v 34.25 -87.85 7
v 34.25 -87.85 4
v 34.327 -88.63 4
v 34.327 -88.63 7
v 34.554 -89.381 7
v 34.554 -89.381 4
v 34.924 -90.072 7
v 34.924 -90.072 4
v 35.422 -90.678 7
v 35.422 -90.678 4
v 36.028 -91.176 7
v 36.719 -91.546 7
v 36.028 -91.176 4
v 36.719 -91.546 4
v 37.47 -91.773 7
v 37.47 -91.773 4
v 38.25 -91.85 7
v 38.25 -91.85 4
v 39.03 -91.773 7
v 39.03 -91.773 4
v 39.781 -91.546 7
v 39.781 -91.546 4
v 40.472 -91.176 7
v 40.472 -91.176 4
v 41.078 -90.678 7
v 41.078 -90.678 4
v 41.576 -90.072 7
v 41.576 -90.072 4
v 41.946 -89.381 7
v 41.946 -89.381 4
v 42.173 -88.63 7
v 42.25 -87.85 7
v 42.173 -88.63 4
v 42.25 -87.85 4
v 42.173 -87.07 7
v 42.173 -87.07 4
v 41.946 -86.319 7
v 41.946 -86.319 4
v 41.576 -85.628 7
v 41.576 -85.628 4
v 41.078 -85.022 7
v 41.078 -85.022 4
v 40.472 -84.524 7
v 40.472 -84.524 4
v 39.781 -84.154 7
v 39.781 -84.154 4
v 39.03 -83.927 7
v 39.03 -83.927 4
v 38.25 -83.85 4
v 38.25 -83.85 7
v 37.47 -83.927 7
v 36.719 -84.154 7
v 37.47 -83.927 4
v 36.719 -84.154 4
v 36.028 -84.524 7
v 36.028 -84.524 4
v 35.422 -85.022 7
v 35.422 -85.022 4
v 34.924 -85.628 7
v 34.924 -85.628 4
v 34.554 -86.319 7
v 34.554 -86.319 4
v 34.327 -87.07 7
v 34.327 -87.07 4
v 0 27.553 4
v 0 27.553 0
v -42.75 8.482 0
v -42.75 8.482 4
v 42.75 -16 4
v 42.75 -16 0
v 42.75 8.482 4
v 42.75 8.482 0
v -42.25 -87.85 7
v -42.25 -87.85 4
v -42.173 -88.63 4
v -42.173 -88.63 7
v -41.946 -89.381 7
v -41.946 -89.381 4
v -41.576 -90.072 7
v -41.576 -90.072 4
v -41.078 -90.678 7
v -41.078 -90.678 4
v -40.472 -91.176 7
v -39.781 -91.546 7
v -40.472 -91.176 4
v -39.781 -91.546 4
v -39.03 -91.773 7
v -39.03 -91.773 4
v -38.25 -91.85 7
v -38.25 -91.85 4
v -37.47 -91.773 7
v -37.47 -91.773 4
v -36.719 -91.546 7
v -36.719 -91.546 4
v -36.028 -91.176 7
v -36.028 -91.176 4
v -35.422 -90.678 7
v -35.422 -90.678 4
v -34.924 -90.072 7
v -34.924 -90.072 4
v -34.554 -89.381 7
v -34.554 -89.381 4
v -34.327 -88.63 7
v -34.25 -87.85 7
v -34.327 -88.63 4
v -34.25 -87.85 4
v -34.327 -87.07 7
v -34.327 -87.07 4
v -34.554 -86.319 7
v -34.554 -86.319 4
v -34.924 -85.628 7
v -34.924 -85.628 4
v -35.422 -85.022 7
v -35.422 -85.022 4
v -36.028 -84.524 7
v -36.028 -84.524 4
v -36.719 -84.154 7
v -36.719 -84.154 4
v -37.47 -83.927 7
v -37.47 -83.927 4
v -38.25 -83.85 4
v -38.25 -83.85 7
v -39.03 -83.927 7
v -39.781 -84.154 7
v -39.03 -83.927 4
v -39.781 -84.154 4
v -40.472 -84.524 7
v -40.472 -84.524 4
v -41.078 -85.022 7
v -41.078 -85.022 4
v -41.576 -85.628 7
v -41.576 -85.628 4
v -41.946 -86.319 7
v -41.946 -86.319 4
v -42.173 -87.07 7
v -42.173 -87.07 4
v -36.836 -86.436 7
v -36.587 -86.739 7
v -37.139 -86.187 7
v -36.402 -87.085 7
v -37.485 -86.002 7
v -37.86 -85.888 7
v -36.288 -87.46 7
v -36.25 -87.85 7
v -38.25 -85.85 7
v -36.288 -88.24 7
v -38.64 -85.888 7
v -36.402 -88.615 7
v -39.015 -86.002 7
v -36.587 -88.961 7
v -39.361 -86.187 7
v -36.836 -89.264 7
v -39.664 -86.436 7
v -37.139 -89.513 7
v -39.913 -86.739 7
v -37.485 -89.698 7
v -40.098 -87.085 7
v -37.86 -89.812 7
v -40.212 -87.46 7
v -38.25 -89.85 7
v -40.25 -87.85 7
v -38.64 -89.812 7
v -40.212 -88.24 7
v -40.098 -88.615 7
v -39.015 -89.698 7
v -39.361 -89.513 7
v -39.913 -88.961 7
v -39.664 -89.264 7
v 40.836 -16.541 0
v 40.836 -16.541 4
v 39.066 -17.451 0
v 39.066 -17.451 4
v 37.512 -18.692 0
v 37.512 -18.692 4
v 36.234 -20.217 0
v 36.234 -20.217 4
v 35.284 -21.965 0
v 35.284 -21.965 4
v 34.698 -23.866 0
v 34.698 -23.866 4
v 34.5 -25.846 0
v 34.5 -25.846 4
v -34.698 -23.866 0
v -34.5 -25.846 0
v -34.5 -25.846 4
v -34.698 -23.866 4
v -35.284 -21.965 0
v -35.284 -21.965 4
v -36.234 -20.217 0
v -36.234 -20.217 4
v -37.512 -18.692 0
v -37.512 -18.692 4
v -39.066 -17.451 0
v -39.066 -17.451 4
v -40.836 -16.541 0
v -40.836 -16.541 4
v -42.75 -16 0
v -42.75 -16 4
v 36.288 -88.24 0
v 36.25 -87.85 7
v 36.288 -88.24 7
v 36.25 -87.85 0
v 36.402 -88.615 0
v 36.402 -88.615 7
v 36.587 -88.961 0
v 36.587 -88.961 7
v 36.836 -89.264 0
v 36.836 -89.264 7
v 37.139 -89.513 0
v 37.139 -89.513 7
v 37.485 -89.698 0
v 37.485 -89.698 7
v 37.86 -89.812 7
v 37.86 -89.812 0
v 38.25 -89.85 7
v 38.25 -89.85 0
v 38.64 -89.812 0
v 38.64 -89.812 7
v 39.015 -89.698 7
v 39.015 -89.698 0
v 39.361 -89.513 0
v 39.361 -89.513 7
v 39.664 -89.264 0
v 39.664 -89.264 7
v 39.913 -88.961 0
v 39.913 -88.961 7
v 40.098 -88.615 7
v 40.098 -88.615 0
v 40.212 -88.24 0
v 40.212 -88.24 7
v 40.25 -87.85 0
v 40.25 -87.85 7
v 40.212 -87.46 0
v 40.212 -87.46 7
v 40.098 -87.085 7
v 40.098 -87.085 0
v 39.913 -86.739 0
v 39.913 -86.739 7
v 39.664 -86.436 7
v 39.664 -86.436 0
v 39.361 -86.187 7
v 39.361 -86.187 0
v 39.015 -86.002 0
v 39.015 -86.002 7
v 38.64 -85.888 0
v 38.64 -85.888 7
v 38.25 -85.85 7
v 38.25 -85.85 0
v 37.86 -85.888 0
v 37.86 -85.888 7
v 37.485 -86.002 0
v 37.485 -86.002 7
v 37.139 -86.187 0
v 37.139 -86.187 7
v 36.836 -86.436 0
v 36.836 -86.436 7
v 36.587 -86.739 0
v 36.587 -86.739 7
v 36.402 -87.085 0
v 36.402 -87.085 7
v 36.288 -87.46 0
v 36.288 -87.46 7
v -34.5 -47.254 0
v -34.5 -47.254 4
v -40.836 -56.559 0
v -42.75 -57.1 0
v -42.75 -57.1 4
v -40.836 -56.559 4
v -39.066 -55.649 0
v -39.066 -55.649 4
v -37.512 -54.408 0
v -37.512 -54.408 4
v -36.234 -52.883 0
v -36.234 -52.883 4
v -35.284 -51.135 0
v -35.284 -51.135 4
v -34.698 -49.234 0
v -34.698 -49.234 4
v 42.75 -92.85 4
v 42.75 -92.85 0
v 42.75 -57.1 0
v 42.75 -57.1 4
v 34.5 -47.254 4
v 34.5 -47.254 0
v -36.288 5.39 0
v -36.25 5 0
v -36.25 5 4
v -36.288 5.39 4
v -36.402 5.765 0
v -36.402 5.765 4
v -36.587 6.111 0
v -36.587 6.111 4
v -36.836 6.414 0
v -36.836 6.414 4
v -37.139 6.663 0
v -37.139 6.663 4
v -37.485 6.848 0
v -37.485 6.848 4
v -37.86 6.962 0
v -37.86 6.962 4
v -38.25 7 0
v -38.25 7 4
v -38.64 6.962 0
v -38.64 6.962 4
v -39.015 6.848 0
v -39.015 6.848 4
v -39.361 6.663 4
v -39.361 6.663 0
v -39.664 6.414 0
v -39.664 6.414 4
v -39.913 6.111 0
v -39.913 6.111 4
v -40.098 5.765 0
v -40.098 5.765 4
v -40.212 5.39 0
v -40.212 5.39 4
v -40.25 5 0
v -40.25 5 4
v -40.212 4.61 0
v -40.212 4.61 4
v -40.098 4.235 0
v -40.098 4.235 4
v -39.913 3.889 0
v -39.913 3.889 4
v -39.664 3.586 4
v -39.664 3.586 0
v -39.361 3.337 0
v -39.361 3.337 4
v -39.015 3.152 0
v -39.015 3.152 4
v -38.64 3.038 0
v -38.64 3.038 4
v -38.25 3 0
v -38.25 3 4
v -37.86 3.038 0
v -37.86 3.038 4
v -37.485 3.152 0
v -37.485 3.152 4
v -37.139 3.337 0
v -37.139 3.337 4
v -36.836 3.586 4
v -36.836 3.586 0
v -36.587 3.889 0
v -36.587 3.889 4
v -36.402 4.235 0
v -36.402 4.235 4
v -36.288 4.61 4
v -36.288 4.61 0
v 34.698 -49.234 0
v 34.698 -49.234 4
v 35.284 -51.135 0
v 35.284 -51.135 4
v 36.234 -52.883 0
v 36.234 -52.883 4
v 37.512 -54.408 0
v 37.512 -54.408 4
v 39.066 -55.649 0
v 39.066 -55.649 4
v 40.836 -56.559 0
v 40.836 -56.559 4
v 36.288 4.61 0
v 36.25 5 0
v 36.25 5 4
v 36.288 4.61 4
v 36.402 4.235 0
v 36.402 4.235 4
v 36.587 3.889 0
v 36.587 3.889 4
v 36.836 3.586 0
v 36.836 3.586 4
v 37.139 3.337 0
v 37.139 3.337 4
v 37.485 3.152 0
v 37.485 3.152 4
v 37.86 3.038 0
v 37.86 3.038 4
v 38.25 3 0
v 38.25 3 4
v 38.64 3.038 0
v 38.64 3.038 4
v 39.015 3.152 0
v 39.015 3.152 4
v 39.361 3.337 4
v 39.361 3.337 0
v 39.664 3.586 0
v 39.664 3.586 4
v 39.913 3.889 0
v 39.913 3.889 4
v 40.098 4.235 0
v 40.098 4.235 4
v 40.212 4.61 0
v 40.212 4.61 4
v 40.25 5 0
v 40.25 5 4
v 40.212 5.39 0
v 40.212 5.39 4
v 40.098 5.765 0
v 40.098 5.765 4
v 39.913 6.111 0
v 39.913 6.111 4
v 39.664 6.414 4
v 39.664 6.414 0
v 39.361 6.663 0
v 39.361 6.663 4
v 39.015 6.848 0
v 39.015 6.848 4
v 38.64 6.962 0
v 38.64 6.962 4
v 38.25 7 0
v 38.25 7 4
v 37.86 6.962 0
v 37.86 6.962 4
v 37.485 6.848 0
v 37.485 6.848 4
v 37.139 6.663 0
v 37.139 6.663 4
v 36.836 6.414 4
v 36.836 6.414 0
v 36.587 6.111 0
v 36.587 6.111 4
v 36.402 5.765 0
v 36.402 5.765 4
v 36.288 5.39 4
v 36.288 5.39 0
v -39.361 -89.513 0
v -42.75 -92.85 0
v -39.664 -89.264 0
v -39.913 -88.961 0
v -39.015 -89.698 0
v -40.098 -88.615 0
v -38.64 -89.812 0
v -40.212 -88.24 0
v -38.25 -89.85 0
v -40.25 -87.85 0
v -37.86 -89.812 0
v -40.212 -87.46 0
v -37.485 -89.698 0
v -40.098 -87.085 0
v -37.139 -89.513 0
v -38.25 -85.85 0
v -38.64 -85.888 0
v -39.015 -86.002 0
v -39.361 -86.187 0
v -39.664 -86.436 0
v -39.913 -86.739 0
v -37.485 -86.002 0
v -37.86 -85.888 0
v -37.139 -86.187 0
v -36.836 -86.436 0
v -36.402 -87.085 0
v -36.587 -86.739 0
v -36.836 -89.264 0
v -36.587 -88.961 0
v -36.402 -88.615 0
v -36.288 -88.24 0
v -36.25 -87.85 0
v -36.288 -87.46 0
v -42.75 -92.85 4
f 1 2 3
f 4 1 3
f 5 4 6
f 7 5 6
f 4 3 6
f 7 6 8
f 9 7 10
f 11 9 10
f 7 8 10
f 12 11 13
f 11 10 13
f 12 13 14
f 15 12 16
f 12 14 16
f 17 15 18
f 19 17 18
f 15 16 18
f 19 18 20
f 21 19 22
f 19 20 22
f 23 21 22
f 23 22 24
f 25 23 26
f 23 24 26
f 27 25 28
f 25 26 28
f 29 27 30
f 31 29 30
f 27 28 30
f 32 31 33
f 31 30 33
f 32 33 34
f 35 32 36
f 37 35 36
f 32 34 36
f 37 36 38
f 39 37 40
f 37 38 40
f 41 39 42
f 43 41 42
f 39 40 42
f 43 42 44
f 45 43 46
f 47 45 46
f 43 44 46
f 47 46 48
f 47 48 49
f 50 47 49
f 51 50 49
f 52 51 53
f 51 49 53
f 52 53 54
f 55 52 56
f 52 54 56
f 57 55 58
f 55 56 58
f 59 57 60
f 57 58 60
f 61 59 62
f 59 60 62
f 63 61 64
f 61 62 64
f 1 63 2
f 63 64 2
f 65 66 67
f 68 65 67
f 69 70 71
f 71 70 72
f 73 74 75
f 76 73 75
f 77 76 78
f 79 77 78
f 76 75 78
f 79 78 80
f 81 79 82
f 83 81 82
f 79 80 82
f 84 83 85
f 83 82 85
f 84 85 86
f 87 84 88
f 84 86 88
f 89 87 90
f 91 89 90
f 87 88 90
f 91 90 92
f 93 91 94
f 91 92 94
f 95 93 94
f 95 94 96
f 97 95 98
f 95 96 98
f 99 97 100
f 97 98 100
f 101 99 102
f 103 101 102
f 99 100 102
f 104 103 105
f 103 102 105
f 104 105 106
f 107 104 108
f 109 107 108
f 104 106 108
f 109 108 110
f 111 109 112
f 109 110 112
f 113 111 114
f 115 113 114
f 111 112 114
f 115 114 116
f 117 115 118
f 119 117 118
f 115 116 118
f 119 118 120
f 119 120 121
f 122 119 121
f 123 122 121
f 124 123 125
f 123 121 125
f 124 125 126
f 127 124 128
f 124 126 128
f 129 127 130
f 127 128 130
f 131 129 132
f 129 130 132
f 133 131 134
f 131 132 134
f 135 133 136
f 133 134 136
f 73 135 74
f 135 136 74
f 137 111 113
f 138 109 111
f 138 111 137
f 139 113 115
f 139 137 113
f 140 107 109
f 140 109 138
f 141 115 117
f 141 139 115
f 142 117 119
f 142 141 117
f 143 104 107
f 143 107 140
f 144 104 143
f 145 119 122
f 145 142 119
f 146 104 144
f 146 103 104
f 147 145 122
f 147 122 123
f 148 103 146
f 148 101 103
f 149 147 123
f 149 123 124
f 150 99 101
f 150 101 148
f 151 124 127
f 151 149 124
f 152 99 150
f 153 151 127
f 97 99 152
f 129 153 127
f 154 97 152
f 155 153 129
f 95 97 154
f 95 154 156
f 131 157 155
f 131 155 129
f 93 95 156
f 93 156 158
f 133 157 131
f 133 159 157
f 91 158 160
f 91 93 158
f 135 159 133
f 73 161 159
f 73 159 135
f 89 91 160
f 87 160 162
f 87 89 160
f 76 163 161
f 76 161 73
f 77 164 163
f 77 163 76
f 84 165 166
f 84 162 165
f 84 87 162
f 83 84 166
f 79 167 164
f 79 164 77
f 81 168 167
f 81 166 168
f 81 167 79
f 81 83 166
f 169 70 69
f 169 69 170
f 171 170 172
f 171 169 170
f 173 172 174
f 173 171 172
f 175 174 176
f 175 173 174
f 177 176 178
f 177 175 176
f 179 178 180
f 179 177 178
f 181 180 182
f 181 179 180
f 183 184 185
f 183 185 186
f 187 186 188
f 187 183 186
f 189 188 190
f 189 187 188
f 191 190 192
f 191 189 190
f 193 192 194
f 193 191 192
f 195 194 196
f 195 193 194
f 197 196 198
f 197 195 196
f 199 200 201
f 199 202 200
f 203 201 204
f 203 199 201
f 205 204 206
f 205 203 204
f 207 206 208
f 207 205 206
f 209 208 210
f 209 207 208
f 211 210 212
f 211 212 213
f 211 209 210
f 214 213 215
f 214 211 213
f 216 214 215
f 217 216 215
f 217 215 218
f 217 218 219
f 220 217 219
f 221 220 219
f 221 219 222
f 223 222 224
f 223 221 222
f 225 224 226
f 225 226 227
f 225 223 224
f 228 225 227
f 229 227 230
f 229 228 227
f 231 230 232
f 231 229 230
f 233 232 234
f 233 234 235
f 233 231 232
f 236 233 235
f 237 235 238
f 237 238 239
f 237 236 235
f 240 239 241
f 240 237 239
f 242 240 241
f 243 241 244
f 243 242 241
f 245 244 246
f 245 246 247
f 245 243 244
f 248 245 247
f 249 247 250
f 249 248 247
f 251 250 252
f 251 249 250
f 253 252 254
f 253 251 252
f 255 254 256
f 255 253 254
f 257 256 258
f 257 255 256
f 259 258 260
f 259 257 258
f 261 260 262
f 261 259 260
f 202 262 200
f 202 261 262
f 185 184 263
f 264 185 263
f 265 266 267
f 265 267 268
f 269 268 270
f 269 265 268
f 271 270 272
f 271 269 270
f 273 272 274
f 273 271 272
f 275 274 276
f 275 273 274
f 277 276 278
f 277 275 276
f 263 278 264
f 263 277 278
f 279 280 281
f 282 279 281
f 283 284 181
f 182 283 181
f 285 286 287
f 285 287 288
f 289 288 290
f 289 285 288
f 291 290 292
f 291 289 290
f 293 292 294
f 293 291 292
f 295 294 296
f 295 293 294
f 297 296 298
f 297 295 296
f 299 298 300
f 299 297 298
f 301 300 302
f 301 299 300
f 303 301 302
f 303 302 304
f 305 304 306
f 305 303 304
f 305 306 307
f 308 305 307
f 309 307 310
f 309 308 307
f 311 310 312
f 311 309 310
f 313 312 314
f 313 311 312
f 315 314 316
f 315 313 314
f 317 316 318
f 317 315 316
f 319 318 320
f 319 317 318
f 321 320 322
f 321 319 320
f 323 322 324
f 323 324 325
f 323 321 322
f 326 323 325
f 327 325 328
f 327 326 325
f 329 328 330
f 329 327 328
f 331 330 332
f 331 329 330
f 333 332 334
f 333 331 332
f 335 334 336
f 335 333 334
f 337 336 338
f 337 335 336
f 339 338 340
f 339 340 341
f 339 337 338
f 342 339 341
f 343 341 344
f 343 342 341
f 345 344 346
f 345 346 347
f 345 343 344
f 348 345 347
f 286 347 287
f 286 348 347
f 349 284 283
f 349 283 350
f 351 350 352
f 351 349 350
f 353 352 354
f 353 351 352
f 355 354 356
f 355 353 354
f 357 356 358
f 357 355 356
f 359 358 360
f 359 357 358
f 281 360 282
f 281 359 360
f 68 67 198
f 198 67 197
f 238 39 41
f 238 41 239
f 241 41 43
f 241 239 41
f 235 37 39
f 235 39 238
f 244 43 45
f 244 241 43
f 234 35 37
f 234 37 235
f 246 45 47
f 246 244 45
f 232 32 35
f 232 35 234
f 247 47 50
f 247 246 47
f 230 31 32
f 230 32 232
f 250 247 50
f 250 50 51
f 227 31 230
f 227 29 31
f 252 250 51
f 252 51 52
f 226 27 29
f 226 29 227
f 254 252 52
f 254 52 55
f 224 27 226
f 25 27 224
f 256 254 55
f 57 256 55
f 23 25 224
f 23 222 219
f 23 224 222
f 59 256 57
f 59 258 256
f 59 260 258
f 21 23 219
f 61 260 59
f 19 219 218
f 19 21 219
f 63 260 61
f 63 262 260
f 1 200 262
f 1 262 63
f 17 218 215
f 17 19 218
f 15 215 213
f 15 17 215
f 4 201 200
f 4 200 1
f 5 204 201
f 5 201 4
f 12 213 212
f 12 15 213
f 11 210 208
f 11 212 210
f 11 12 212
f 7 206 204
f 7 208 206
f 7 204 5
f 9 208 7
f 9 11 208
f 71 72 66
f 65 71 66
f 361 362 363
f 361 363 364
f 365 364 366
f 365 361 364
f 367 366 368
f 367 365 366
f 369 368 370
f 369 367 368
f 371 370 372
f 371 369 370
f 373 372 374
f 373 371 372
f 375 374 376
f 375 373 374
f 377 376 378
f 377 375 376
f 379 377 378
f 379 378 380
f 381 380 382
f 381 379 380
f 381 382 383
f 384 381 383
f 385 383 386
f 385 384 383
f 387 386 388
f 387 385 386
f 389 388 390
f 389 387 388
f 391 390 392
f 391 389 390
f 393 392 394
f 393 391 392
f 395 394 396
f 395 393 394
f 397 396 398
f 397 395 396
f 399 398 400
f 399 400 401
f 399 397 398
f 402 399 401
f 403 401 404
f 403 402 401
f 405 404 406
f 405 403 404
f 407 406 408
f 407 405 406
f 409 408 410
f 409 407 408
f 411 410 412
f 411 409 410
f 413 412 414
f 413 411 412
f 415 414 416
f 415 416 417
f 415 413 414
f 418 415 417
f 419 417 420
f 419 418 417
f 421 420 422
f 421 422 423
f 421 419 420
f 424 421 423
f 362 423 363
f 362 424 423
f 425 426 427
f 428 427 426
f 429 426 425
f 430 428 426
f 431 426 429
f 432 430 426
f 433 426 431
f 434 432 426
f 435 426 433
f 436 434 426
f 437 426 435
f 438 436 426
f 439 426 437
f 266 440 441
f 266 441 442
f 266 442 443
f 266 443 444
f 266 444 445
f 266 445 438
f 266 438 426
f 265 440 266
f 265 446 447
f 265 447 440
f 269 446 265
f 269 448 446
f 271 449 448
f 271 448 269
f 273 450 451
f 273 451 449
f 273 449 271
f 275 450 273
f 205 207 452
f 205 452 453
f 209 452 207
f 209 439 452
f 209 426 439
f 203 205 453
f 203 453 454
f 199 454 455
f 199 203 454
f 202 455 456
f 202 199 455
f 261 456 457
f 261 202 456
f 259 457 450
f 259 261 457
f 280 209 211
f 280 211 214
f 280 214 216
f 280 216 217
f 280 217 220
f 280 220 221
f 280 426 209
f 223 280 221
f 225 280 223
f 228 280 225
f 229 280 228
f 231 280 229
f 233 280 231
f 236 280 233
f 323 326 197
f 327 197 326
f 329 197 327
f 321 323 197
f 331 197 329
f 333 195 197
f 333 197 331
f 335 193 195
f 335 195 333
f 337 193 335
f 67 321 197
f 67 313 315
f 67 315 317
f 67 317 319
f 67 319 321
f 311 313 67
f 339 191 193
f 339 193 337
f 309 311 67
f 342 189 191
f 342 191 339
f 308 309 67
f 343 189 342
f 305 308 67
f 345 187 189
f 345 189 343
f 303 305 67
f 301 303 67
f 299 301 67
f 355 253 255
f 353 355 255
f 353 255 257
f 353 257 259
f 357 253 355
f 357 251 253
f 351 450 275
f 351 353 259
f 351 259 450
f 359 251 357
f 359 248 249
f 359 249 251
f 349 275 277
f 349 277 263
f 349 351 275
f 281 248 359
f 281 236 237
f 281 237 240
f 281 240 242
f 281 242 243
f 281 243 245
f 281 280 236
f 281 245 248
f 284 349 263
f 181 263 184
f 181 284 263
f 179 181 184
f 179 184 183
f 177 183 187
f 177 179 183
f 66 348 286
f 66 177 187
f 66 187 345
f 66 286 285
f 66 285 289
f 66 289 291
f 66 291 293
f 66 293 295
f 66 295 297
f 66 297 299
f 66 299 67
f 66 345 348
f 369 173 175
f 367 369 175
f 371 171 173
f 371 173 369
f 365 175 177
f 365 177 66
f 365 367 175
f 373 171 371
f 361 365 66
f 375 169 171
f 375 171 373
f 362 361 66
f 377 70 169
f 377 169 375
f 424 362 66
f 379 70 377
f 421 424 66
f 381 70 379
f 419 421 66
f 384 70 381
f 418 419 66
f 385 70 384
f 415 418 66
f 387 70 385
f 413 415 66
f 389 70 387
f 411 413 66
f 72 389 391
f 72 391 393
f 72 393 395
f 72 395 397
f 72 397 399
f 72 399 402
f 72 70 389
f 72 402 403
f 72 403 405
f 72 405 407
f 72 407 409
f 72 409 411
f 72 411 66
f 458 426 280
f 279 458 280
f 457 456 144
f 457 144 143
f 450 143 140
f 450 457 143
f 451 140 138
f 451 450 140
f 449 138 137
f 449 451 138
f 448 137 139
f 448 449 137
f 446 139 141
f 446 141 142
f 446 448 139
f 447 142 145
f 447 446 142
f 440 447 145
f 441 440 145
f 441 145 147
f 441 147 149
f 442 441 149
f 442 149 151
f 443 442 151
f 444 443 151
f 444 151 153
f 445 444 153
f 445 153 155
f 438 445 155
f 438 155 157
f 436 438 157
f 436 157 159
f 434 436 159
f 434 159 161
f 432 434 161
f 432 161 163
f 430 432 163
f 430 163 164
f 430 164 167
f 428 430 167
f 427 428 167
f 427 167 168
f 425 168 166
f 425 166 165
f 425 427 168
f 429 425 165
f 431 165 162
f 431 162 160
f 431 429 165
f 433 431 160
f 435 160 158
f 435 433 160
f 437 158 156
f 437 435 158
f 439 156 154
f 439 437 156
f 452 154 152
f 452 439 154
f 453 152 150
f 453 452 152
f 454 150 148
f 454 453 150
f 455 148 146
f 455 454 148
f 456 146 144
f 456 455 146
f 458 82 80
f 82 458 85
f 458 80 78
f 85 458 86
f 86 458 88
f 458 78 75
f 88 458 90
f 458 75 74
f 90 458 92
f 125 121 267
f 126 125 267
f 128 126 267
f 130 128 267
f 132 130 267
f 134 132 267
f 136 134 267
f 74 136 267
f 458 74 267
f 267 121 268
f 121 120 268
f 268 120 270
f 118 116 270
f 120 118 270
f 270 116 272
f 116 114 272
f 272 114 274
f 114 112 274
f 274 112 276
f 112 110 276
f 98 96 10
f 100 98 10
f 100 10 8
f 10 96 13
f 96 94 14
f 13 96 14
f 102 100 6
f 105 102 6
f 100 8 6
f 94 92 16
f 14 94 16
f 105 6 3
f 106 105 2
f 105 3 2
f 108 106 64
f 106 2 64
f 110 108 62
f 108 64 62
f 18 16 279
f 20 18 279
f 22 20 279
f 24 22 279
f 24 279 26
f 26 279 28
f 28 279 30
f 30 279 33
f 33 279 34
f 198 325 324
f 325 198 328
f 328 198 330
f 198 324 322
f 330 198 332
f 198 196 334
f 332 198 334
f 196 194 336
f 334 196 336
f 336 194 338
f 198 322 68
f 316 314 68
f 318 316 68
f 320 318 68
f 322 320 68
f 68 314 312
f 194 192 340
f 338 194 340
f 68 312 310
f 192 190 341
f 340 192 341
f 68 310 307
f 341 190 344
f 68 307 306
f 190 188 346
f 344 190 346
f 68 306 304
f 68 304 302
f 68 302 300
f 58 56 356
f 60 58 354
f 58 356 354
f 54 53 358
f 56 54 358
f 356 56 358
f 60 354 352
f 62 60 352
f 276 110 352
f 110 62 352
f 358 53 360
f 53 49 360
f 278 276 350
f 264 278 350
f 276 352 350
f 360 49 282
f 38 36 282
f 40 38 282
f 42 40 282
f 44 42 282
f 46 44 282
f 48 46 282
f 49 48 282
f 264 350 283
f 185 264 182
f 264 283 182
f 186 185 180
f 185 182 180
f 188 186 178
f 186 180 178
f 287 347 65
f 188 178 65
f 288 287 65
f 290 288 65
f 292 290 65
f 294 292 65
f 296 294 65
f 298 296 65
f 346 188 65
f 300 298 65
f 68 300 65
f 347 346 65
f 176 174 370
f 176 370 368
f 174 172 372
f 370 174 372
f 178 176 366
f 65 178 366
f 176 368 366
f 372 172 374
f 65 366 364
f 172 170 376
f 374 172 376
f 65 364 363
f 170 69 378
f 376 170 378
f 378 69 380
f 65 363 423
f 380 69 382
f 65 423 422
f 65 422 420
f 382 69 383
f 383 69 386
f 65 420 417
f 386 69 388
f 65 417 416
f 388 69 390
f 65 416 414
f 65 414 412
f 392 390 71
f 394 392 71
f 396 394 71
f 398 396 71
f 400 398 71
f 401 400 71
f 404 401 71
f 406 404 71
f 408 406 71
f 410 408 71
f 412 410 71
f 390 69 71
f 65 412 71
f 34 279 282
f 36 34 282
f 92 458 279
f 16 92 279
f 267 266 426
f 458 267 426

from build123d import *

# Parameters (mm, degrees)
SKETCH3_R           = 2
BOSS_EXTRUDE1_DEPTH = 4
FILLET1_R           = 10
SKETCH4_R           = 4
SKETCH4_R_2         = 2
BOSS_EXTRUDE2_DEPTH = 3


with BuildPart() as part:
    # Sketch3 → Boss-Extrude1 (new body)
    with BuildSketch(Plane.XY):
        Polygon((-42.75, 8.482081222), (-42.75, -16), (-34.5, -16), (-34.5, -57.1), (-42.75, -57.1), (-42.75, -92.85), (42.75, -92.85), (42.75, -57.1), (34.5, -57.1), (34.5, -16), (42.75, -16), (42.75, 8.482081222), (0, 27.552713192), align=None)
        with Locations((-38.25, 5)):
            Circle(SKETCH3_R, mode=Mode.SUBTRACT)
        with Locations((-38.25, -87.85)):
            Circle(SKETCH3_R, mode=Mode.SUBTRACT)
        with Locations(Location((38.25, -87.85, 0), (0, 0, 180))):
            Circle(SKETCH3_R, mode=Mode.SUBTRACT)
        with Locations(Location((38.25, 5, 0), (0, 0, 180))):
            Circle(SKETCH3_R, mode=Mode.SUBTRACT)
    extrude(amount=BOSS_EXTRUDE1_DEPTH)

    # Fillet1
    # the kernel refuses this fillet: 10 mm, written as the material it adds along each edge
    with BuildSketch(Plane(origin=(34.5, -57.1, 0), x_dir=(1, 0, 0), z_dir=(0, 0, 1)), Plane(origin=(-34.5, -16, 0), x_dir=(-1, 0, 0), z_dir=(0, 0, 1))) as fillet1_piece_1:
        with BuildLine():
            CenterArc((10, 9.845684334), FILLET1_R, 180, 79.921341892)
            Line((0, 9.845684334), (-0.2, 9.845684334))
            Line((-0.2, 9.845684334), (-0.2, 0))
            Line((-0.2, 0), (0, -0.2))
            ThreePointArc((0, -0.2), (4.125, -0.2), (8.215, -0.196913687))
            Line((8.215, -0.196913687), (8.25, 0))
        make_face()
    extrude(amount=4)
    with BuildSketch(Plane(origin=(34.5, -16, 0), x_dir=(0, -1, 0), z_dir=(0, 0, 1)), Plane(origin=(-34.5, -57.1, 0), x_dir=(0, 1, 0), z_dir=(0, 0, 1))) as fillet1_piece_2:
        with BuildLine():
            CenterArc((9.845684334, 10), FILLET1_R, 190.078658108, 79.921341892)
            Line((0, 8.25), (-0.196913687, 8.215))
            ThreePointArc((-0.196913687, 8.215), (-0.2, 4.125), (-0.2, 0))
            Line((-0.2, 0), (0, -0.2))
            Line((0, -0.2), (9.845684334, -0.2))
            Line((9.845684334, -0.2), (9.845684334, 0))
        make_face()
    extrude(amount=4)

    # Sketch4 → Boss-Extrude2 (add)
    # profile 1 of 2: a face of its own
    with BuildSketch(Plane.XY.offset(4)):
        with Locations(Location((38.25, -87.85, 0), (0, 0, 180))):
            Circle(SKETCH4_R)
        with Locations(Location((38.25, -87.85, 0), (0, 0, 180))):
            Circle(SKETCH4_R_2, mode=Mode.SUBTRACT)
    # profile 2 of 2: a face of its own
    with BuildSketch(Plane.XY.offset(4)):
        with Locations(Location((-38.25, -87.85, 0), (0, 0, 180))):
            Circle(SKETCH4_R)
        with Locations((-38.25, -87.85)):
            Circle(SKETCH4_R_2, mode=Mode.SUBTRACT)
    extrude(amount=BOSS_EXTRUDE2_DEPTH)


solid = part.part
